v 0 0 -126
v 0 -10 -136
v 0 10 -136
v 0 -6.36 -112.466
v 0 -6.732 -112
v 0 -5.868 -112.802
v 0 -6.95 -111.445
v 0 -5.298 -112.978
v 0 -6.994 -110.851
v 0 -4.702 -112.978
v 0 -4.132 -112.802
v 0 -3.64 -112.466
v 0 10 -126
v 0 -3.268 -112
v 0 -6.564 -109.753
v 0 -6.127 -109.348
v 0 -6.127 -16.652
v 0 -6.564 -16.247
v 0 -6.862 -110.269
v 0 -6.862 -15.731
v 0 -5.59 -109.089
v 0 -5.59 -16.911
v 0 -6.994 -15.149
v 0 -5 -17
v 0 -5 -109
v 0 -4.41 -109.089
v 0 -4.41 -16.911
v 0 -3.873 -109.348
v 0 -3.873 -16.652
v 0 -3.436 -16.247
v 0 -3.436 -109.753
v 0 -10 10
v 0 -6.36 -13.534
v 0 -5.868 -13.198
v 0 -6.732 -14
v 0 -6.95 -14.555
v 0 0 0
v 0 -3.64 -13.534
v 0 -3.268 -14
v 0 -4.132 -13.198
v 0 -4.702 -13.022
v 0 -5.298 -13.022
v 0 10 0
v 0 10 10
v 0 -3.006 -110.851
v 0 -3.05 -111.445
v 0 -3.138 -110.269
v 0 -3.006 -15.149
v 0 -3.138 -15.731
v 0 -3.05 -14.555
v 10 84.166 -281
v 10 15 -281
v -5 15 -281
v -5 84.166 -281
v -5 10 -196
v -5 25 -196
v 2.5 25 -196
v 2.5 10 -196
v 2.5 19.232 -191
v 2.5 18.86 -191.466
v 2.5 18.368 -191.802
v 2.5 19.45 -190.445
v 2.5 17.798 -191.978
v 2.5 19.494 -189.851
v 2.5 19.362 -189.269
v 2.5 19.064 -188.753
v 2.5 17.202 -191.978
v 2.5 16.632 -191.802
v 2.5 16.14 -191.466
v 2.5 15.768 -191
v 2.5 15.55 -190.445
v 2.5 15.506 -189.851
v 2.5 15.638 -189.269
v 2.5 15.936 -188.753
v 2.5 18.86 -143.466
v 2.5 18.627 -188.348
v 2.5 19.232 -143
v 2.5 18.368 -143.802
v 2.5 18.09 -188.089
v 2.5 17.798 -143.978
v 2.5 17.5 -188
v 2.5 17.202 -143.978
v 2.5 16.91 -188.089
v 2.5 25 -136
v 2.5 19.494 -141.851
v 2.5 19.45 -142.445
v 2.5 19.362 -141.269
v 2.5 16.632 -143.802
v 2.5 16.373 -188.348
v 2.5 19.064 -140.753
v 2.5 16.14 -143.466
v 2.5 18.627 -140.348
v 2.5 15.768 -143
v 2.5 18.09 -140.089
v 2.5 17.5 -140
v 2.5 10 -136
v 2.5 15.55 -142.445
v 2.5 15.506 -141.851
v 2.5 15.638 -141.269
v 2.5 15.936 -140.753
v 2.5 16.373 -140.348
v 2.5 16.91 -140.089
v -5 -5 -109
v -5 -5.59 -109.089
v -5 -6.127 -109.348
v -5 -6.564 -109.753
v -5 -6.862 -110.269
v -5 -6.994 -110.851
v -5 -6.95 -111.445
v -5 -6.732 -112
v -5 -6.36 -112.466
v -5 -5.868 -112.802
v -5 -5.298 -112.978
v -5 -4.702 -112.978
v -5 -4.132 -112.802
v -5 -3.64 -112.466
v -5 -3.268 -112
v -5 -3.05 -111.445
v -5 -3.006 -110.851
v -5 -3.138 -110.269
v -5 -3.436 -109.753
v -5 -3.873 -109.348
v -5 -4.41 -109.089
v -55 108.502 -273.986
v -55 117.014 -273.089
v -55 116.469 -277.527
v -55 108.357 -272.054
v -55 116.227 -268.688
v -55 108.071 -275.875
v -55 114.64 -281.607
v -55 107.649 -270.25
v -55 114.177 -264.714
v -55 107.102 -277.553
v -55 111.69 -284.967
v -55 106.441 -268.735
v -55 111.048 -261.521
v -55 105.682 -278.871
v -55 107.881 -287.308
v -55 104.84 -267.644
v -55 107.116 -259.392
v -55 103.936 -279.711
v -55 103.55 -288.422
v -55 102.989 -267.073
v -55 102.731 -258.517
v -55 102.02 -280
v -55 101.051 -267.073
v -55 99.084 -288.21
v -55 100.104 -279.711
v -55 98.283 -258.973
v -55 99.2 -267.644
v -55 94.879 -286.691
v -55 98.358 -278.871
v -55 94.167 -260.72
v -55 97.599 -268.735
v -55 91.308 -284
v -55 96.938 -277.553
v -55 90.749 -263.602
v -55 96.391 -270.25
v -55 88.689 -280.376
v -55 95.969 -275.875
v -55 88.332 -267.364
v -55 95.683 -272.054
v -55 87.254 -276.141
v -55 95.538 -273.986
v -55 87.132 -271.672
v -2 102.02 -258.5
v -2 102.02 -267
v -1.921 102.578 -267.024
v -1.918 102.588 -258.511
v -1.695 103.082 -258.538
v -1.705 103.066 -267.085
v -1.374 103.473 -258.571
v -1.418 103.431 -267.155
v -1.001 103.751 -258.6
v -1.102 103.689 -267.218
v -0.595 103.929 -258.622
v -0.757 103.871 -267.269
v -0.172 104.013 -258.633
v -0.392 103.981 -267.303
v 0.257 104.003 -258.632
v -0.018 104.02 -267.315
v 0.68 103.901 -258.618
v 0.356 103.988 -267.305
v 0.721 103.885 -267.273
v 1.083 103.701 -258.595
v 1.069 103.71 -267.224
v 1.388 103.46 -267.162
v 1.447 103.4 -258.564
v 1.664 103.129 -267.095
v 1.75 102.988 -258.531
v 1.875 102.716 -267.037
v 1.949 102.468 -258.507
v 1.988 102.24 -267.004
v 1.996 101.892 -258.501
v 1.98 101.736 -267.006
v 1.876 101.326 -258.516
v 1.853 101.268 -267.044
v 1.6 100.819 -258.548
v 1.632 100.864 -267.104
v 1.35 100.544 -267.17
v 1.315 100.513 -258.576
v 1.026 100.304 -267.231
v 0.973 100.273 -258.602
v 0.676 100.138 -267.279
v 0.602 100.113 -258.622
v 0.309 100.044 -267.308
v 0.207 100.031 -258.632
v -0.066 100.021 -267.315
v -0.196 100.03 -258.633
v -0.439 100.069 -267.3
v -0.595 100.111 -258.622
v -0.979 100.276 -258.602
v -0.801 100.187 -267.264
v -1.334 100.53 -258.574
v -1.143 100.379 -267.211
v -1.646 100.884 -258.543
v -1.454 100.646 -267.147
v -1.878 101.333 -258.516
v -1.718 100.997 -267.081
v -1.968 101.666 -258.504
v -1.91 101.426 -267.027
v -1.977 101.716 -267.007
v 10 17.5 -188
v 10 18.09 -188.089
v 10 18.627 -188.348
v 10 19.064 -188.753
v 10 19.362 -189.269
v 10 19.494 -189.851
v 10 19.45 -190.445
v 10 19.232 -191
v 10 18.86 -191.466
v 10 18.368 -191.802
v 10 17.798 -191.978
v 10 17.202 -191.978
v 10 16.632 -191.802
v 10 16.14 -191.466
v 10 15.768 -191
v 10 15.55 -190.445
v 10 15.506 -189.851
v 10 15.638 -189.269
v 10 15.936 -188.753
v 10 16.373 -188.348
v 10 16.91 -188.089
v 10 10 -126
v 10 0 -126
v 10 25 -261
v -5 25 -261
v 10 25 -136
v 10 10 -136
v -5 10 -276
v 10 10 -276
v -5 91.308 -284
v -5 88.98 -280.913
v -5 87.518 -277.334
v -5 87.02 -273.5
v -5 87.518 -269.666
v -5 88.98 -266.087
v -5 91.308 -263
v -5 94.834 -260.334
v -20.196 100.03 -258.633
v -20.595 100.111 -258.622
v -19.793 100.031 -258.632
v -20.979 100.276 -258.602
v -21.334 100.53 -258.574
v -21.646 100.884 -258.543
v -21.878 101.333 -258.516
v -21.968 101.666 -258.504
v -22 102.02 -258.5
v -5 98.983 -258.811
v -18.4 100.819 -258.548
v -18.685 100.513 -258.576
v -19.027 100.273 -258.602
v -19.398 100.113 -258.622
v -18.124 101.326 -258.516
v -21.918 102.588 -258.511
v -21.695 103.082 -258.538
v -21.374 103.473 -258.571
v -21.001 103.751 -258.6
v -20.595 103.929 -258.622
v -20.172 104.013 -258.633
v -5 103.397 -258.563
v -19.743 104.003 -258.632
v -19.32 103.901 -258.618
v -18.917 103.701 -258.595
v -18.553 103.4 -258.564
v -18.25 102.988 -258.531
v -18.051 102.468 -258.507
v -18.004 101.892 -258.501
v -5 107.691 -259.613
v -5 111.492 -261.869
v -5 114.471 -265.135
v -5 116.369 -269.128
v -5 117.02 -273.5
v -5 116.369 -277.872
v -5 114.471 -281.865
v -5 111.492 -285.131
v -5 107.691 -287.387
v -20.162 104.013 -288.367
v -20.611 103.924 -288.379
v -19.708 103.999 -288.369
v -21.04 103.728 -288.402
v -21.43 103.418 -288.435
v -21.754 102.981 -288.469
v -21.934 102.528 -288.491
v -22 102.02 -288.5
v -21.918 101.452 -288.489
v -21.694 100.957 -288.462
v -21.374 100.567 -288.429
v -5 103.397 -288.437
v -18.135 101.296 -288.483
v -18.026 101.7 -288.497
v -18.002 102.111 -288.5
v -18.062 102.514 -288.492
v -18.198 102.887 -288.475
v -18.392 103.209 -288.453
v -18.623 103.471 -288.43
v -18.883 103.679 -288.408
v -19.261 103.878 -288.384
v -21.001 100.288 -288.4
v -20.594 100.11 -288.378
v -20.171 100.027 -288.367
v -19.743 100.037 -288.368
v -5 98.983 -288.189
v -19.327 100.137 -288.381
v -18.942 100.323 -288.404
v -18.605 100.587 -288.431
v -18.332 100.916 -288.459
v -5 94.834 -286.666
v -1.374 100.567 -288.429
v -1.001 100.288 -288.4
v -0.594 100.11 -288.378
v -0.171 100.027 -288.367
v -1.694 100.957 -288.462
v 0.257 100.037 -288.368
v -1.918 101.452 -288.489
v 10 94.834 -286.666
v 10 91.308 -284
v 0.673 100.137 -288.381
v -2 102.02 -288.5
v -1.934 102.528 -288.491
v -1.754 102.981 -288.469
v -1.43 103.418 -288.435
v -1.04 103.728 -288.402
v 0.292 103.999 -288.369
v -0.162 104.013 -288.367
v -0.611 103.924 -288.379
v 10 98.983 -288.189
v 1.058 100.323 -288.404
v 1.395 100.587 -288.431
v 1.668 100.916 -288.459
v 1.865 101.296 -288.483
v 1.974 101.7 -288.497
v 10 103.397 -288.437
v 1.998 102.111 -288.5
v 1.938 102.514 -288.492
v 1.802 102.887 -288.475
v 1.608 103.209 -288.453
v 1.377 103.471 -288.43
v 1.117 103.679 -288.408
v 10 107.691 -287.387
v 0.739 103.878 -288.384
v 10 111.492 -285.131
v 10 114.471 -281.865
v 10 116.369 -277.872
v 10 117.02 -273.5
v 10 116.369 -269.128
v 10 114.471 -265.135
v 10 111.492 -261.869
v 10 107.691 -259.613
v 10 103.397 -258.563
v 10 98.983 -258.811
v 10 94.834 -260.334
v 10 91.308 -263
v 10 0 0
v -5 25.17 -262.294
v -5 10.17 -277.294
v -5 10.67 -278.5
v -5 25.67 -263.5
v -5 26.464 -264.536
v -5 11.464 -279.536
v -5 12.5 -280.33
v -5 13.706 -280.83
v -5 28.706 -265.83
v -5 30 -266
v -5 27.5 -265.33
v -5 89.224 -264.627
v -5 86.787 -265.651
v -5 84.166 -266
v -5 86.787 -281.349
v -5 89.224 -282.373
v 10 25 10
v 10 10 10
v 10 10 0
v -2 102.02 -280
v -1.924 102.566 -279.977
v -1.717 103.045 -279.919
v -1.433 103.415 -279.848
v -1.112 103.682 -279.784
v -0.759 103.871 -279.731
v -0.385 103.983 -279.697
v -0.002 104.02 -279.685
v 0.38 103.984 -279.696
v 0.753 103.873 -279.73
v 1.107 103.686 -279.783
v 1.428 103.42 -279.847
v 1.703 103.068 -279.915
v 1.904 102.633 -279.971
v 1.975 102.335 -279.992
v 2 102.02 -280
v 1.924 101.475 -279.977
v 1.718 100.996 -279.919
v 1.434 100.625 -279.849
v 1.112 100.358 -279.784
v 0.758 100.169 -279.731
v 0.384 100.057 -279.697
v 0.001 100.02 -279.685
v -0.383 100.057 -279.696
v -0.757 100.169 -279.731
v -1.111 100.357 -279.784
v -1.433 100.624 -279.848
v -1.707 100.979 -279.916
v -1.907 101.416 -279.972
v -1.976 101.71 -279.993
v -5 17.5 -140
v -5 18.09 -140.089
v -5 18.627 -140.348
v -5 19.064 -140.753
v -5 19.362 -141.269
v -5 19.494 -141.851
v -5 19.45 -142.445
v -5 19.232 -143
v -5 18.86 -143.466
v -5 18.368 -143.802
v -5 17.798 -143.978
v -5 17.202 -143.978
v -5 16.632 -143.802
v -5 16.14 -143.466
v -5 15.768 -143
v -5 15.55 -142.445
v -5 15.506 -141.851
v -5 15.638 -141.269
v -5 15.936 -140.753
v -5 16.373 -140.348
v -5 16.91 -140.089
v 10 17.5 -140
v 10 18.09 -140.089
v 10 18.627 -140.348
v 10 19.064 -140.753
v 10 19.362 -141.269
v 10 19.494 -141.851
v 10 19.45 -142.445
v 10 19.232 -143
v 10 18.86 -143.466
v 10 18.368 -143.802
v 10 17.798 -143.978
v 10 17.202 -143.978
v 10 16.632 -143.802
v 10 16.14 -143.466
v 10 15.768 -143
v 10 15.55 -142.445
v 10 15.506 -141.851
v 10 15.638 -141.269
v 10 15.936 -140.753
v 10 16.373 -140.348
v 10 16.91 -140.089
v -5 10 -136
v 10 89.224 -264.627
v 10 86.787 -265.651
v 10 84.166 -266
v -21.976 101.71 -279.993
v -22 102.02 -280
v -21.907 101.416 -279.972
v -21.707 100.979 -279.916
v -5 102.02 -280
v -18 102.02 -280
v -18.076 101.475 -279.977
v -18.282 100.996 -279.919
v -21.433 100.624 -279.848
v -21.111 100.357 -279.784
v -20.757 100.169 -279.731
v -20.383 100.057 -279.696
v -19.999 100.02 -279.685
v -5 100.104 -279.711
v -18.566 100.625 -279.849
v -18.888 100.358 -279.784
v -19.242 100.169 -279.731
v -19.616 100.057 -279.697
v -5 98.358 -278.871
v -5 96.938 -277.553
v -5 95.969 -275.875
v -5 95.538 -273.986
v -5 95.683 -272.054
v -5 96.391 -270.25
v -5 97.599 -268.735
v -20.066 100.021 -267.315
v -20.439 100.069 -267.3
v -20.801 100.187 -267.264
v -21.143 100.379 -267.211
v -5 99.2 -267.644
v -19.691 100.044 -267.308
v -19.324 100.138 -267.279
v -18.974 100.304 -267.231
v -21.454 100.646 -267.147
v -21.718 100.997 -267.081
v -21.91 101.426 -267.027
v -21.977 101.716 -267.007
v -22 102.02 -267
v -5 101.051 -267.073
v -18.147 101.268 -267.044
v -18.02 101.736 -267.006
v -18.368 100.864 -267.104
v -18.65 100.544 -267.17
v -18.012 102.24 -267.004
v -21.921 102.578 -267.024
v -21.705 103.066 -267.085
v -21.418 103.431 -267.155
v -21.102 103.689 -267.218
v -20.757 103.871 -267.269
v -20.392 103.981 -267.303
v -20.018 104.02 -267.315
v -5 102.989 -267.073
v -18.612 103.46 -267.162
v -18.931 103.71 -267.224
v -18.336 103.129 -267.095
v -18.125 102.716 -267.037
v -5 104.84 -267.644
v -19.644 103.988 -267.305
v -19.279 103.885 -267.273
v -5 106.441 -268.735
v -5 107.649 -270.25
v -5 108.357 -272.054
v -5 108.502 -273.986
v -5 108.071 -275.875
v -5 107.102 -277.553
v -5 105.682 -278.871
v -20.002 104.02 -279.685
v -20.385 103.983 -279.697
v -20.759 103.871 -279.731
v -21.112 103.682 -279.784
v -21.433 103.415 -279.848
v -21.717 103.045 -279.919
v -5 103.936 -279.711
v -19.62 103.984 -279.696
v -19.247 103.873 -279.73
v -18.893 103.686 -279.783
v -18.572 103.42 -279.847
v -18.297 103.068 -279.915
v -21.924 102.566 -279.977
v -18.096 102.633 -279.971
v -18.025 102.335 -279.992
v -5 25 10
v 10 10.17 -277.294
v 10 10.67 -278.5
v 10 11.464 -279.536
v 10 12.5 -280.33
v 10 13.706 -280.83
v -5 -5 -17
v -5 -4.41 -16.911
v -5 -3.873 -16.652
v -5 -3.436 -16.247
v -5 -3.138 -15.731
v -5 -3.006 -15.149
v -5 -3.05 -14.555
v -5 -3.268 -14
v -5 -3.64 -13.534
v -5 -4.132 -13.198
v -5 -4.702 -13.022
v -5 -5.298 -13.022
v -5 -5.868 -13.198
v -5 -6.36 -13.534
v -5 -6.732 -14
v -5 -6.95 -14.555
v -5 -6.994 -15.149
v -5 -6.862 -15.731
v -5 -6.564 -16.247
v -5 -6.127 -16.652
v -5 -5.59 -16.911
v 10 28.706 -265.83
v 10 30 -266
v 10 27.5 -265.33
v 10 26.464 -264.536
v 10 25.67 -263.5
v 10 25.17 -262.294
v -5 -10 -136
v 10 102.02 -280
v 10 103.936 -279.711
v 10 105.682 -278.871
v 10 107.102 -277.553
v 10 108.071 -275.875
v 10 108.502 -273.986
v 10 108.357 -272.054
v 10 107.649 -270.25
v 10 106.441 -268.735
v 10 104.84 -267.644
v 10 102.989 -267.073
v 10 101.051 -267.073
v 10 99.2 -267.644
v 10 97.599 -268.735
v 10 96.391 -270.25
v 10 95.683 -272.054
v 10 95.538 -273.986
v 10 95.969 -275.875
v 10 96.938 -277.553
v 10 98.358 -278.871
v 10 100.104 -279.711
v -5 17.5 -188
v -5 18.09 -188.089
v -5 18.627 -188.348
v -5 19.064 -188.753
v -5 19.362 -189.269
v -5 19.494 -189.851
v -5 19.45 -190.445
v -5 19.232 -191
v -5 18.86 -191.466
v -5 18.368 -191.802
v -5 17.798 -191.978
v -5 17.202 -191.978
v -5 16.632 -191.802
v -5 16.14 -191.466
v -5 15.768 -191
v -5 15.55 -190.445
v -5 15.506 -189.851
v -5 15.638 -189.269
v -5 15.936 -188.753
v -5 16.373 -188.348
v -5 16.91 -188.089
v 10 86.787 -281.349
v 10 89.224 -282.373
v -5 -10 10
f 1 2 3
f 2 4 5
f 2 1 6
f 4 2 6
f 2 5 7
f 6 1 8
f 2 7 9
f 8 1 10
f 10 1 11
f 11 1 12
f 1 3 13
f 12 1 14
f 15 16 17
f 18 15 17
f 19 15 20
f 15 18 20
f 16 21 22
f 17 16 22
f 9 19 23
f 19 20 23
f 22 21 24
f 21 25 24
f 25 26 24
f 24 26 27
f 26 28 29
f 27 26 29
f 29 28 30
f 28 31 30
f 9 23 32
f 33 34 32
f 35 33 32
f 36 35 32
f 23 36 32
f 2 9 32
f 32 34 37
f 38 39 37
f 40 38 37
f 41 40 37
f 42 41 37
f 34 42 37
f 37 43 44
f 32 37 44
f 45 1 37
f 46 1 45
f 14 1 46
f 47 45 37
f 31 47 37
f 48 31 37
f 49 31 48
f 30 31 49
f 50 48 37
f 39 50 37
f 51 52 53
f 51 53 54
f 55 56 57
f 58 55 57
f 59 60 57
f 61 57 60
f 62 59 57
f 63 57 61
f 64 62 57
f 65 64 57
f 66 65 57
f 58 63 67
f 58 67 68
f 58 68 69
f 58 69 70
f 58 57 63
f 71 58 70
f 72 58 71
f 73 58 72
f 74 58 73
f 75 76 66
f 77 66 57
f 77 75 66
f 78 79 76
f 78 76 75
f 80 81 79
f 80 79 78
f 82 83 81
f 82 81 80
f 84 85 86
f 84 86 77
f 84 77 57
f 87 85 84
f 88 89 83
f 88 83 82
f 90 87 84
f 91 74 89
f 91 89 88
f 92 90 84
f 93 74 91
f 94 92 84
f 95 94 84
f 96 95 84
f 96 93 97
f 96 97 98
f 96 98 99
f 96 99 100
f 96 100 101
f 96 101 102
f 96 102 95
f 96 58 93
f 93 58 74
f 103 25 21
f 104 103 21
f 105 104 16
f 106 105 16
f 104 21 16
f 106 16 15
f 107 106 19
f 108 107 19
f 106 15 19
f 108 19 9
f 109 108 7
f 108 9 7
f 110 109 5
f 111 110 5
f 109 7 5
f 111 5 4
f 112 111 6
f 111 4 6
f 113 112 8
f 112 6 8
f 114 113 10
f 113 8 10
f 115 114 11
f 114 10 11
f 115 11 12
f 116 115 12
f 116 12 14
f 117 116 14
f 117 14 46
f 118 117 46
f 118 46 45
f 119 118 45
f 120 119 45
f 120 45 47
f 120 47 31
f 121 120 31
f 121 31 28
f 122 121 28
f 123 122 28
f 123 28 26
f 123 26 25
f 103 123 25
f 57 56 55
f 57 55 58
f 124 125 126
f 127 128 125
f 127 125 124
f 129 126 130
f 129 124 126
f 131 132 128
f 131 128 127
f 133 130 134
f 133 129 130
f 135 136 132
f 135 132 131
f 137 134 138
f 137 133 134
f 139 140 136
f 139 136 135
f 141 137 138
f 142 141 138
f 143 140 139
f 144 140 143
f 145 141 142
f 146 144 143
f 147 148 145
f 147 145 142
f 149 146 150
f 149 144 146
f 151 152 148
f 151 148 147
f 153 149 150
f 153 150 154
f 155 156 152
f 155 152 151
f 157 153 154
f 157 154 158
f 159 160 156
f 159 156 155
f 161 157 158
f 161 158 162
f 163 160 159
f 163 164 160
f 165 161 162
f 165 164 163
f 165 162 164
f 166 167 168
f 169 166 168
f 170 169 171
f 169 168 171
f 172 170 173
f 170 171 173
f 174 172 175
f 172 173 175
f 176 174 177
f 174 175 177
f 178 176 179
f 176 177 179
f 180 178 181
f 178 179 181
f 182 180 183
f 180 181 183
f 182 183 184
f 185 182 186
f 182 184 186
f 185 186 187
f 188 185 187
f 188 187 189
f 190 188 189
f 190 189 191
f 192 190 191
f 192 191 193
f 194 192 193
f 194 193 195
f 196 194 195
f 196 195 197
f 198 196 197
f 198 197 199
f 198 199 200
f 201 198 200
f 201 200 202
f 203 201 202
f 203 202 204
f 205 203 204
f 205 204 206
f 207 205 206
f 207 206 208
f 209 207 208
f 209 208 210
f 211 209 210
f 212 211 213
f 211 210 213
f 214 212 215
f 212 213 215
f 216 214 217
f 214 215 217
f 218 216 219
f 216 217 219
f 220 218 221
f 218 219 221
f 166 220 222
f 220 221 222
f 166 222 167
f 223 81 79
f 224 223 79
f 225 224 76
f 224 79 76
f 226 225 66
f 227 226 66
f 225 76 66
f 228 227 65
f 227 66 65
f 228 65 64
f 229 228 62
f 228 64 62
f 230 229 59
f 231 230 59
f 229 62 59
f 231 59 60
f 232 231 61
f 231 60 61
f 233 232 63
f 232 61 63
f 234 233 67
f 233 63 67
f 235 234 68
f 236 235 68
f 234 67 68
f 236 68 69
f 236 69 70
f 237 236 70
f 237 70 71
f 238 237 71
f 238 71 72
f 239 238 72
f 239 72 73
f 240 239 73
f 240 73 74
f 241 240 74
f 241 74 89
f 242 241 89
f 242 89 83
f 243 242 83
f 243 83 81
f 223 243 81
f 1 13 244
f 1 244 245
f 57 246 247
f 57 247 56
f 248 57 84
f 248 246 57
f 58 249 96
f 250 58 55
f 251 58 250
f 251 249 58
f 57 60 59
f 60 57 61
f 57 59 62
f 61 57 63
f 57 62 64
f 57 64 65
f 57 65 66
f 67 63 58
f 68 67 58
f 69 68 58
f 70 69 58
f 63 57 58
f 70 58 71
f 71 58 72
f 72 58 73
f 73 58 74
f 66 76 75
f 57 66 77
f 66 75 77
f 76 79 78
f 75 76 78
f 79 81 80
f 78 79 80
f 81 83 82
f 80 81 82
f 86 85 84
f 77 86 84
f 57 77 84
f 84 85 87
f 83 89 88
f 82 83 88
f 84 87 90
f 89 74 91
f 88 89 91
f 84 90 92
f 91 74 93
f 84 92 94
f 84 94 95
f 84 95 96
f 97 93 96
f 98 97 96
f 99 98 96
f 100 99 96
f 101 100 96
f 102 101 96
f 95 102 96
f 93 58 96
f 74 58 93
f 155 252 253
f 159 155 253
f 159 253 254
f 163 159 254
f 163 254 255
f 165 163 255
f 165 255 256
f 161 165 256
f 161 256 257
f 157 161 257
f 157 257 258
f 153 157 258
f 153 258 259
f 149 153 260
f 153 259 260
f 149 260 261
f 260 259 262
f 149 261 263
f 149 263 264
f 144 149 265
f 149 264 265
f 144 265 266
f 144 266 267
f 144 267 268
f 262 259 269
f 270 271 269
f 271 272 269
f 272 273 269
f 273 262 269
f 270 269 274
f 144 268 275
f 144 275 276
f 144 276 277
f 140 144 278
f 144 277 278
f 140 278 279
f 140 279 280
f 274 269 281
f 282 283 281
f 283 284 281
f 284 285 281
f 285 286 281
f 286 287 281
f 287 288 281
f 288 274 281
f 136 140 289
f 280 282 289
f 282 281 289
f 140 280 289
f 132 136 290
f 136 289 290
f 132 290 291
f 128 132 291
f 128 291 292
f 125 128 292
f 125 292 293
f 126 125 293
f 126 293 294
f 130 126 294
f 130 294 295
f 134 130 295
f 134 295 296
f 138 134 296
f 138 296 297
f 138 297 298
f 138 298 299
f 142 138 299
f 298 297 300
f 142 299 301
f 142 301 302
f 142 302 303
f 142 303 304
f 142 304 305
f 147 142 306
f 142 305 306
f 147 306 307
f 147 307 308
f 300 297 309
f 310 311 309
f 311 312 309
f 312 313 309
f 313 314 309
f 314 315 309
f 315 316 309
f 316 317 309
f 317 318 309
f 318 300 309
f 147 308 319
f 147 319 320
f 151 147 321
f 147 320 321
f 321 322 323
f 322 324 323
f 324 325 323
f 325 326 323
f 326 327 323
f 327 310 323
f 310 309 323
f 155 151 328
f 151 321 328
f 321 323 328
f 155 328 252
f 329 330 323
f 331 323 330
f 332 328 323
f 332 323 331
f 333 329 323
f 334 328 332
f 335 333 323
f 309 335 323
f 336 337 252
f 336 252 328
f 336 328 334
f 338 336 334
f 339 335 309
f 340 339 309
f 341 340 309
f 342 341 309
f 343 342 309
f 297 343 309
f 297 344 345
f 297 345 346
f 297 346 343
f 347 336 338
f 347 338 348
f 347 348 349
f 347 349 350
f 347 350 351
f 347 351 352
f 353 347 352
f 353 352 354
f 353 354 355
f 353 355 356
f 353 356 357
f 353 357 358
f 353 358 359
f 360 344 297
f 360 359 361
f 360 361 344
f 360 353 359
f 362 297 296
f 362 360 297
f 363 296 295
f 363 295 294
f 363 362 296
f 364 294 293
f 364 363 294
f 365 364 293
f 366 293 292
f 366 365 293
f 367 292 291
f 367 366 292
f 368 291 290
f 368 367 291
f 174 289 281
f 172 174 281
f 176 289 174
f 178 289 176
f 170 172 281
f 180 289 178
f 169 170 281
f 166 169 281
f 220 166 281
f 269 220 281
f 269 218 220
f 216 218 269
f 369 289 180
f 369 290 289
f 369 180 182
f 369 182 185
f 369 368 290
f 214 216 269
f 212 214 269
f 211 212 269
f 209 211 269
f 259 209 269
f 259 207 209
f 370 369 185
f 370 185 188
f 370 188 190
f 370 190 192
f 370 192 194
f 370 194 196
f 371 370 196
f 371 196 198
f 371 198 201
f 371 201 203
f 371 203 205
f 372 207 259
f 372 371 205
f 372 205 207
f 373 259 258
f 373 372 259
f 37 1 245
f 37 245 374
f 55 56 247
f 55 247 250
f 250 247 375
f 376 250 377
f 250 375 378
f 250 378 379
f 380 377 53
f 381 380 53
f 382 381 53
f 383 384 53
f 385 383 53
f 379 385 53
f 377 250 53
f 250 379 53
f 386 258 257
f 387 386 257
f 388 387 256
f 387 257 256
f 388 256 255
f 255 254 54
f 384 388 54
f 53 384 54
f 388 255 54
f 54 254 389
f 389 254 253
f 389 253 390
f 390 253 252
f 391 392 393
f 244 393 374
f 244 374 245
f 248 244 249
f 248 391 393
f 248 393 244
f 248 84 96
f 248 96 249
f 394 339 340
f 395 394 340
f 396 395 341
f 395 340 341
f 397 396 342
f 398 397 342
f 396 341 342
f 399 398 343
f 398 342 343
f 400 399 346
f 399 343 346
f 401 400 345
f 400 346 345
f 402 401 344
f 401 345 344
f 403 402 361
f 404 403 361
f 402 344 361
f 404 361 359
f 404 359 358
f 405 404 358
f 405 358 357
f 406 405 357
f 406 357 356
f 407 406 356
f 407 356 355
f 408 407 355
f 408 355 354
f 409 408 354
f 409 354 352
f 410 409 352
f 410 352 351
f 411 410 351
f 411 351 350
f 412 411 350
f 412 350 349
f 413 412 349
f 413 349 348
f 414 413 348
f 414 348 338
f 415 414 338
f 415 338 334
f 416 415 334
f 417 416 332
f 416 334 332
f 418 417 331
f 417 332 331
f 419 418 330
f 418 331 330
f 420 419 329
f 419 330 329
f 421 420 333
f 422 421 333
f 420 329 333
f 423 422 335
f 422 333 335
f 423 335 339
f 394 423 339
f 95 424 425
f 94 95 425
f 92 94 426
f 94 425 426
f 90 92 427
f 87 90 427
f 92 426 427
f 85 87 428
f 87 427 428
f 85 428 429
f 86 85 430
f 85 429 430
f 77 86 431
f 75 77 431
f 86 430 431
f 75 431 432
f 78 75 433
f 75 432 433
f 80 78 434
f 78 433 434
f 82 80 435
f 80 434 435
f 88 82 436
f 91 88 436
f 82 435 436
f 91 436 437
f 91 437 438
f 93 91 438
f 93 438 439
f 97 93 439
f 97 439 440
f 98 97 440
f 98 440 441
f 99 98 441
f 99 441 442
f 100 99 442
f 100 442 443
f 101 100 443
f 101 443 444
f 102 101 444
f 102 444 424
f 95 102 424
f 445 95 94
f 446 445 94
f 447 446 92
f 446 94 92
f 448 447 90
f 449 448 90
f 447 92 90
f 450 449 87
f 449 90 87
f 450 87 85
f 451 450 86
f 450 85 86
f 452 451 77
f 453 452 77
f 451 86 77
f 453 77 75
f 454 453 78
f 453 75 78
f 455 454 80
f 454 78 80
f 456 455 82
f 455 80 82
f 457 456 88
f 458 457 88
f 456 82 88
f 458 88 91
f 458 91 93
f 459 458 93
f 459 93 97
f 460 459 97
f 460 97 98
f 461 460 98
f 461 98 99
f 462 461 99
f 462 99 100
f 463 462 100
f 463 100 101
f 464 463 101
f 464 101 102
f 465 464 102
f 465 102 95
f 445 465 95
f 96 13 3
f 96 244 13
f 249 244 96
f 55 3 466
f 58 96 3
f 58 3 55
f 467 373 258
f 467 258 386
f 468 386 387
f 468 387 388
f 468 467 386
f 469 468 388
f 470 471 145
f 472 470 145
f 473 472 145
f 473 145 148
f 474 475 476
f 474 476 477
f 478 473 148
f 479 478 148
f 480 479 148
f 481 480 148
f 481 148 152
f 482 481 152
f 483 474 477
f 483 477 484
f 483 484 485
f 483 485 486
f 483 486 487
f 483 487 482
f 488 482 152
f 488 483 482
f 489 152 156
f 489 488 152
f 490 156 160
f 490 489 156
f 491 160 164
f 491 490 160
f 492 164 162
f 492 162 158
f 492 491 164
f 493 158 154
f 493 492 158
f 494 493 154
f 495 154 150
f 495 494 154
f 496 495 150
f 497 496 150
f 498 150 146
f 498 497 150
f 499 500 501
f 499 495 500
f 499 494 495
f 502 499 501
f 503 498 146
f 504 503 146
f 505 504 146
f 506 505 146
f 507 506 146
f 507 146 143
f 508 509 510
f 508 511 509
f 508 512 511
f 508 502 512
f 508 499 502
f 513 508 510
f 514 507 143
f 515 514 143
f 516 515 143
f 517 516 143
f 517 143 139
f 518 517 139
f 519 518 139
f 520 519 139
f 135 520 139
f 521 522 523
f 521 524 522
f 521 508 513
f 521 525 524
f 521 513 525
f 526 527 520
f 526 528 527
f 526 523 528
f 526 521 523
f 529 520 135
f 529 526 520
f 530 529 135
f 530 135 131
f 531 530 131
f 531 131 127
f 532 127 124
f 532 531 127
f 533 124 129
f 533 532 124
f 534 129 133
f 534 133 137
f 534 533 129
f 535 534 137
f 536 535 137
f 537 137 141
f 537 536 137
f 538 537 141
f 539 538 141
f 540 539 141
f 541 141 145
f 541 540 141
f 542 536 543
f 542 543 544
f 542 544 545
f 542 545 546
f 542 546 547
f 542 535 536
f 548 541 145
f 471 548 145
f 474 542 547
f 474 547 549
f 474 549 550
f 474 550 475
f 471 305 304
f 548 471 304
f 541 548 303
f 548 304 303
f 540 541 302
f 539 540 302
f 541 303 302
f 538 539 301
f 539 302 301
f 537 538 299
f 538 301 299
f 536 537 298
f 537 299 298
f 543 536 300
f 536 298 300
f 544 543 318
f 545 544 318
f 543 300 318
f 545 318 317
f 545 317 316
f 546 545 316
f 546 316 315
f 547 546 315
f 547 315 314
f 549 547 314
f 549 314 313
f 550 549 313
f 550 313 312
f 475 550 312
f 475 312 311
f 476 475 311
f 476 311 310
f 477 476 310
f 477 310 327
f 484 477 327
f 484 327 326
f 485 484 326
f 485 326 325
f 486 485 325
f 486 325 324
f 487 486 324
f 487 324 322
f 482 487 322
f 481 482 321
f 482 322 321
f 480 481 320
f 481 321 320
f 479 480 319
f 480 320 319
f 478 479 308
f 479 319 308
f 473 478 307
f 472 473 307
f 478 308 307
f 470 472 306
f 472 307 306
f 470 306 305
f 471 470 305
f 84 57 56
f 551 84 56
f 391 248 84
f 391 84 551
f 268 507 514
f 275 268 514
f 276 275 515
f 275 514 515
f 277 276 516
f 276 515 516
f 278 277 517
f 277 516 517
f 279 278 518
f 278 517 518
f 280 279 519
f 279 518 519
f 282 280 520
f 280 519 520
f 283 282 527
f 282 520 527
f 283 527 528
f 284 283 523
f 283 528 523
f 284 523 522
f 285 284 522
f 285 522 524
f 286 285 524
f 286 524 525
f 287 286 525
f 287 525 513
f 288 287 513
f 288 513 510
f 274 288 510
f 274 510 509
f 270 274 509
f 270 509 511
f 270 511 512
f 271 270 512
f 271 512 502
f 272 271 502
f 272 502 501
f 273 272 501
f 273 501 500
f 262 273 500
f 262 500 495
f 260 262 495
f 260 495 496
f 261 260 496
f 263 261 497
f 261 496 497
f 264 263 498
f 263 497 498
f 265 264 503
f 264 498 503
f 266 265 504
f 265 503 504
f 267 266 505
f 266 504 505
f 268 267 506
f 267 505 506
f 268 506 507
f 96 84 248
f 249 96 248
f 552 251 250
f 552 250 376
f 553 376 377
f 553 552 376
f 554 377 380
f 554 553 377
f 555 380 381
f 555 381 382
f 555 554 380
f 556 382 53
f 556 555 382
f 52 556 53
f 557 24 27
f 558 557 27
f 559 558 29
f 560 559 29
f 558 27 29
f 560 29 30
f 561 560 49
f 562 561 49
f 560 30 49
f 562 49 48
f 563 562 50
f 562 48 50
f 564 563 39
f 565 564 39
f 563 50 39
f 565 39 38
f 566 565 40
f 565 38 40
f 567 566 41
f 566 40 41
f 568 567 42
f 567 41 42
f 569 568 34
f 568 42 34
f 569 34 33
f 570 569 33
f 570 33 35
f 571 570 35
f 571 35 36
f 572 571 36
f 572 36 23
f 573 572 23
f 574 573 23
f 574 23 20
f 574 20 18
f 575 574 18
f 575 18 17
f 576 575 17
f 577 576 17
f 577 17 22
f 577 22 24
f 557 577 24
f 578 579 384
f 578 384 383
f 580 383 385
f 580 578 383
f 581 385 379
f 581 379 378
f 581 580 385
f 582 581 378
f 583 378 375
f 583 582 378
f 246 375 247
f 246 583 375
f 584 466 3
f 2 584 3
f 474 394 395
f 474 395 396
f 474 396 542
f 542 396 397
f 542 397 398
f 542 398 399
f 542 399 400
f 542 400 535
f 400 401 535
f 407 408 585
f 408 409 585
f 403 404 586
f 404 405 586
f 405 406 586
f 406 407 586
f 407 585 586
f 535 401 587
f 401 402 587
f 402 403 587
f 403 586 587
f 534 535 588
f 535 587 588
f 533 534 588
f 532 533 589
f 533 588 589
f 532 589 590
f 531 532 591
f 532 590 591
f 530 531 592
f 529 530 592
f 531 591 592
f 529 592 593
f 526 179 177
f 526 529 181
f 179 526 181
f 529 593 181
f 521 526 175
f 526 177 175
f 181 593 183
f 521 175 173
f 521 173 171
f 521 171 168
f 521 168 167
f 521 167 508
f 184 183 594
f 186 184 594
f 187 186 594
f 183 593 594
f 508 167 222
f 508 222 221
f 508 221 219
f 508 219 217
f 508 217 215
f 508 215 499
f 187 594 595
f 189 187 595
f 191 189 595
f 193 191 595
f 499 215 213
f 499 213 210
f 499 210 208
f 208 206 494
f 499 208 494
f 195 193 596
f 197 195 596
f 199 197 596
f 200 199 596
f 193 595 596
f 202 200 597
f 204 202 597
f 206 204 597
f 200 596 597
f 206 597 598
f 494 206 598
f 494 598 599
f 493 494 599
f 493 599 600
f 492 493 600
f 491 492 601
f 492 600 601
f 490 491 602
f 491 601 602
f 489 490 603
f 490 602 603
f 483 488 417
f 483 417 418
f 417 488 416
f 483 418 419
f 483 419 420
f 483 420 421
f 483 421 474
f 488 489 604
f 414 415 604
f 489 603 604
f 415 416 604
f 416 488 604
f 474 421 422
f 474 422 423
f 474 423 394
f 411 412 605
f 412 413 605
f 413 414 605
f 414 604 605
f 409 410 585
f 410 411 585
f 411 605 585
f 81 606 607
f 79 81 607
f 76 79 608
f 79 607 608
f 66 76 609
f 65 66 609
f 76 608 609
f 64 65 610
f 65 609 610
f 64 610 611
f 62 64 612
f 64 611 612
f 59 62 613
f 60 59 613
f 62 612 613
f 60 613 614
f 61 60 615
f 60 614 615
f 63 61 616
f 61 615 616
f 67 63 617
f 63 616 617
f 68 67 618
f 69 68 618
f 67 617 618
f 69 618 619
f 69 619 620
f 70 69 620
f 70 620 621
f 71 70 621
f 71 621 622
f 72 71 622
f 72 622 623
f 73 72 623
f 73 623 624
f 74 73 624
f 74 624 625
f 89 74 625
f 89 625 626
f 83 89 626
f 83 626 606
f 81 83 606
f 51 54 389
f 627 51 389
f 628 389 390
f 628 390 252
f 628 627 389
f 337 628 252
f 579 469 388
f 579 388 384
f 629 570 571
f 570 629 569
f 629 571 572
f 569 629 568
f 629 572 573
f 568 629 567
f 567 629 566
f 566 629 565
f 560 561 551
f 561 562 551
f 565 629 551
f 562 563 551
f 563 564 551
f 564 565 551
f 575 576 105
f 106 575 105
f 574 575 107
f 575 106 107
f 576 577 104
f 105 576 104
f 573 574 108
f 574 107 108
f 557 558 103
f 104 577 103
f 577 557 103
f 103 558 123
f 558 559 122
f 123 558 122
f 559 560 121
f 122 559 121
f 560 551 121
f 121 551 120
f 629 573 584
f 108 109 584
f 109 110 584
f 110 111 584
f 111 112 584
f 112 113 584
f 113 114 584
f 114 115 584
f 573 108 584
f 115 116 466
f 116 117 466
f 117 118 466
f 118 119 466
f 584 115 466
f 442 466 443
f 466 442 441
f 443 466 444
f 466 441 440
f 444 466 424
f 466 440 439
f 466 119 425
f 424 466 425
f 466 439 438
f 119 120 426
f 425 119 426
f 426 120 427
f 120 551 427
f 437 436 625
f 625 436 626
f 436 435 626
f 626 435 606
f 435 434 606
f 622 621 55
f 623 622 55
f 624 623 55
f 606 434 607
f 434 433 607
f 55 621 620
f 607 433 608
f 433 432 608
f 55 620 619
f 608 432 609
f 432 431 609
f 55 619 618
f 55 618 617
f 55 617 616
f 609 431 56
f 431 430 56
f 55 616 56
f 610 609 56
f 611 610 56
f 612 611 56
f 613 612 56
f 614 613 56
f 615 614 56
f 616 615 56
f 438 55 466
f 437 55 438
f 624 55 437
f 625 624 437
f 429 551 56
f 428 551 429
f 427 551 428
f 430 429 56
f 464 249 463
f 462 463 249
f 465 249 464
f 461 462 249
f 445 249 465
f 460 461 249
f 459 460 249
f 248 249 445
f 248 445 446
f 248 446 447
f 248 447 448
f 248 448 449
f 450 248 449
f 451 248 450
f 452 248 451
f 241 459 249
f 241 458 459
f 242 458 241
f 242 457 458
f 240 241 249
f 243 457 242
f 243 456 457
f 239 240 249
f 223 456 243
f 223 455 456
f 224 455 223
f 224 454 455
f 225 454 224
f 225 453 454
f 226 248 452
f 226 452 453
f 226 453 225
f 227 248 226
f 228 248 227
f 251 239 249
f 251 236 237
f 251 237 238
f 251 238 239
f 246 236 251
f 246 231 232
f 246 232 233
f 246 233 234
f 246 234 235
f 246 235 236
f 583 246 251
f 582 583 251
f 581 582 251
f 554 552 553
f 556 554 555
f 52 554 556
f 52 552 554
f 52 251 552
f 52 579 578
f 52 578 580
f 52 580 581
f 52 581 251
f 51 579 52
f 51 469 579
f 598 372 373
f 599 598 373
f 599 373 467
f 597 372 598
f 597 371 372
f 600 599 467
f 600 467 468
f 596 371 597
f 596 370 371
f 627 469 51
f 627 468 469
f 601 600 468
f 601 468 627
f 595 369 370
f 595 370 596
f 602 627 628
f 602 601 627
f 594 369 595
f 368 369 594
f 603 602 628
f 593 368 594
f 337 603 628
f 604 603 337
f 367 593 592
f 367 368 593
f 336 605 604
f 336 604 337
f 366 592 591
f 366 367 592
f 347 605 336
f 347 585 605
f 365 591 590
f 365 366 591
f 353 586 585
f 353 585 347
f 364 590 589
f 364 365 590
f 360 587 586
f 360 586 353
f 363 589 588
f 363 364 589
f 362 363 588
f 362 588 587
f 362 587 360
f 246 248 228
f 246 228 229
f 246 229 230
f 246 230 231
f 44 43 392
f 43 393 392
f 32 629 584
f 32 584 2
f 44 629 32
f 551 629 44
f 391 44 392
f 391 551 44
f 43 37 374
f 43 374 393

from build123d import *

# Parameters (mm, degrees)
BOSS_EXTRUDE3_DEPTH    = 10
SKETCH8_W              = 146
SKETCH8_H              = 15
BOSS_EXTRUDE6_DEPTH    = 5
SKETCH9_W              = 5
SKETCH9_H              = 146
BOSS_EXTRUDE7_DEPTH    = 20
SKETCH10_R             = 2
CUT_EXTRUDE2_DEPTH     = 20
SKETCH5_R              = 6.5
BOSS_EXTRUDE4_DEPTH    = 15
SKETCH6_R              = 15
SKETCH6_R_2            = 6.5
BOSS_EXTRUDE5_DEPTH    = 50
SKETCH7_R              = 2
CUT_EXTRUDE1_DEPTH     = 50
SKETCH13_R             = 2
CUT_EXTRUDE3_DEPTH     = 20
SPLIT2_SURFACE_1_BACK  = 331.849
SPLIT2_SURFACE_1_DEPTH = 663.698
SPLIT2_SURFACE_2_BACK  = 331.849
SPLIT2_SURFACE_2_DEPTH = 663.698


with BuildPart() as part:
    # Sketch4 → Boss-Extrude3 (new body)
    with BuildSketch(Plane(origin=(0, 0, 0), x_dir=(0, 0, -1), z_dir=(1, 0, 0))):
        Polygon((0, 10), (-10, 10), (-10, 25), (136, 25), (136, 10), (126, 10), (126, 0), (0, 0), align=None)
    extrude(amount=BOSS_EXTRUDE3_DEPTH)

    # Sketch8 → Boss-Extrude6 (add)
    with BuildSketch(Plane.ZY):
        with Locations((-63, 17.5)):
            Rectangle(SKETCH8_W, SKETCH8_H)
    extrude(amount=BOSS_EXTRUDE6_DEPTH)

    # Sketch9 → Boss-Extrude7 (add)
    with BuildSketch(Plane.XZ.offset(-10)):
        with Locations((-2.5, -63)):
            Rectangle(SKETCH9_W, SKETCH9_H)
    extrude(amount=BOSS_EXTRUDE7_DEPTH)

    # Sketch10 → Cut-Extrude2 (cut)
    with BuildSketch(Plane(origin=(0, 0, 0), x_dir=(0, 0, -1), z_dir=(1, 0, 0))):
        with Locations((15, -5)):
            Circle(SKETCH10_R)
        with Locations(Location((111, -5, 0), (0, 0, 180))):
            Circle(SKETCH10_R)
    extrude(amount=-CUT_EXTRUDE2_DEPTH, mode=Mode.SUBTRACT)

    # Sketch5 → Boss-Extrude4 (add)
    with BuildSketch(Plane(origin=(10, 0, 0), x_dir=(0, 0, -1), z_dir=(1, 0, 0))):
        with BuildLine():
            Line((136, 10), (266, 10))
            Line((266, 10), (276, 10))
            ThreePointArc((276, 10), (279.535533906, 11.464466094), (281, 15))
            Line((281, 15), (281, 84.166428929))
            ThreePointArc((281, 84.166428929), (281.780455543, 88.039412275), (284, 91.307857357))
            ThreePointArc((284, 91.307857357), (273.5, 117.02), (263, 91.307857357))
            ThreePointArc((263, 91.307857357), (265.219544457, 88.039412275), (266, 84.166428929))
            Line((266, 84.166428929), (266, 30))
            ThreePointArc((266, 30), (264.535533906, 26.464466094), (261, 25))
            Line((261, 25), (136, 25))
            Line((136, 25), (136, 10))
        make_face()
        with Locations((273.5, 102.02)):
            Circle(SKETCH5_R, mode=Mode.SUBTRACT)
    extrude(amount=-BOSS_EXTRUDE4_DEPTH)

    # Sketch6 → Boss-Extrude5 (add)
    with BuildSketch(Plane.ZY.offset(5)):
        with Locations(Location((-273.5, 102.02, 0), (0, 0, 225.572995999))):
            Circle(SKETCH6_R)
        with Locations(Location((-273.5, 102.02, 0), (0, 0, 180))):
            Circle(SKETCH6_R_2, mode=Mode.SUBTRACT)
    extrude(amount=BOSS_EXTRUDE5_DEPTH)

    # Sketch7 → Cut-Extrude1 (cut)
    with BuildSketch(Plane(origin=(0, 0, -288.5), x_dir=(-1, 0, 0), z_dir=(0, 0, -1))):
        with Locations((20, 102.02)):
            Circle(SKETCH7_R)
        with Locations((0, 102.02)):
            Circle(SKETCH7_R)
    extrude(amount=-CUT_EXTRUDE1_DEPTH, mode=Mode.SUBTRACT)

    # Sketch13 → Cut-Extrude3 (cut)
    with BuildSketch(Plane.ZY.offset(5)):
        with Locations((-190, 17.5)):
            Circle(SKETCH13_R)
        with Locations((-142, 17.5)):
            Circle(SKETCH13_R)
    extrude(amount=-CUT_EXTRUDE3_DEPTH, mode=Mode.SUBTRACT)


with BuildPart() as body_2:
    # Split2: the piece behind the surface
    add(part.part)
    # Split2 surface: a surface, the sketch's curves swept straight by 663.698 mm
    with BuildLine(Plane(origin=(0, 25, 0), x_dir=(1, 0, 0), z_dir=(0, 1, 0)).offset(-SPLIT2_SURFACE_1_BACK), mode=Mode.PRIVATE) as split2_surface_1_path:
        Line((-5, 196), (2.5, 196))
        Line((2.5, 196), (2.5, 136))
        Line((2.5, 136), (10, 136))
    split2_surface_1 = Shell.extrude(split2_surface_1_path.wire(), (0 * SPLIT2_SURFACE_1_DEPTH, 1 * SPLIT2_SURFACE_1_DEPTH, 0 * SPLIT2_SURFACE_1_DEPTH))
    split(bisect_by=split2_surface_1, keep=Keep.BOTTOM)


with BuildPart() as part_1:
    add(part.part)

    # Split2: split by a surface, the side it looks to stays
    # Split2 surface: a surface, the sketch's curves swept straight by 663.698 mm
    with BuildLine(Plane(origin=(0, 25, 0), x_dir=(1, 0, 0), z_dir=(0, 1, 0)).offset(-SPLIT2_SURFACE_2_BACK), mode=Mode.PRIVATE) as split2_surface_2_path:
        Line((-5, 196), (2.5, 196))
        Line((2.5, 196), (2.5, 136))
        Line((2.5, 136), (10, 136))
    split2_surface_2 = Shell.extrude(split2_surface_2_path.wire(), (0 * SPLIT2_SURFACE_2_DEPTH, 1 * SPLIT2_SURFACE_2_DEPTH, 0 * SPLIT2_SURFACE_2_DEPTH))
    split(bisect_by=split2_surface_2, keep=Keep.TOP)


solid = Compound([body_2.part, part_1.part])
